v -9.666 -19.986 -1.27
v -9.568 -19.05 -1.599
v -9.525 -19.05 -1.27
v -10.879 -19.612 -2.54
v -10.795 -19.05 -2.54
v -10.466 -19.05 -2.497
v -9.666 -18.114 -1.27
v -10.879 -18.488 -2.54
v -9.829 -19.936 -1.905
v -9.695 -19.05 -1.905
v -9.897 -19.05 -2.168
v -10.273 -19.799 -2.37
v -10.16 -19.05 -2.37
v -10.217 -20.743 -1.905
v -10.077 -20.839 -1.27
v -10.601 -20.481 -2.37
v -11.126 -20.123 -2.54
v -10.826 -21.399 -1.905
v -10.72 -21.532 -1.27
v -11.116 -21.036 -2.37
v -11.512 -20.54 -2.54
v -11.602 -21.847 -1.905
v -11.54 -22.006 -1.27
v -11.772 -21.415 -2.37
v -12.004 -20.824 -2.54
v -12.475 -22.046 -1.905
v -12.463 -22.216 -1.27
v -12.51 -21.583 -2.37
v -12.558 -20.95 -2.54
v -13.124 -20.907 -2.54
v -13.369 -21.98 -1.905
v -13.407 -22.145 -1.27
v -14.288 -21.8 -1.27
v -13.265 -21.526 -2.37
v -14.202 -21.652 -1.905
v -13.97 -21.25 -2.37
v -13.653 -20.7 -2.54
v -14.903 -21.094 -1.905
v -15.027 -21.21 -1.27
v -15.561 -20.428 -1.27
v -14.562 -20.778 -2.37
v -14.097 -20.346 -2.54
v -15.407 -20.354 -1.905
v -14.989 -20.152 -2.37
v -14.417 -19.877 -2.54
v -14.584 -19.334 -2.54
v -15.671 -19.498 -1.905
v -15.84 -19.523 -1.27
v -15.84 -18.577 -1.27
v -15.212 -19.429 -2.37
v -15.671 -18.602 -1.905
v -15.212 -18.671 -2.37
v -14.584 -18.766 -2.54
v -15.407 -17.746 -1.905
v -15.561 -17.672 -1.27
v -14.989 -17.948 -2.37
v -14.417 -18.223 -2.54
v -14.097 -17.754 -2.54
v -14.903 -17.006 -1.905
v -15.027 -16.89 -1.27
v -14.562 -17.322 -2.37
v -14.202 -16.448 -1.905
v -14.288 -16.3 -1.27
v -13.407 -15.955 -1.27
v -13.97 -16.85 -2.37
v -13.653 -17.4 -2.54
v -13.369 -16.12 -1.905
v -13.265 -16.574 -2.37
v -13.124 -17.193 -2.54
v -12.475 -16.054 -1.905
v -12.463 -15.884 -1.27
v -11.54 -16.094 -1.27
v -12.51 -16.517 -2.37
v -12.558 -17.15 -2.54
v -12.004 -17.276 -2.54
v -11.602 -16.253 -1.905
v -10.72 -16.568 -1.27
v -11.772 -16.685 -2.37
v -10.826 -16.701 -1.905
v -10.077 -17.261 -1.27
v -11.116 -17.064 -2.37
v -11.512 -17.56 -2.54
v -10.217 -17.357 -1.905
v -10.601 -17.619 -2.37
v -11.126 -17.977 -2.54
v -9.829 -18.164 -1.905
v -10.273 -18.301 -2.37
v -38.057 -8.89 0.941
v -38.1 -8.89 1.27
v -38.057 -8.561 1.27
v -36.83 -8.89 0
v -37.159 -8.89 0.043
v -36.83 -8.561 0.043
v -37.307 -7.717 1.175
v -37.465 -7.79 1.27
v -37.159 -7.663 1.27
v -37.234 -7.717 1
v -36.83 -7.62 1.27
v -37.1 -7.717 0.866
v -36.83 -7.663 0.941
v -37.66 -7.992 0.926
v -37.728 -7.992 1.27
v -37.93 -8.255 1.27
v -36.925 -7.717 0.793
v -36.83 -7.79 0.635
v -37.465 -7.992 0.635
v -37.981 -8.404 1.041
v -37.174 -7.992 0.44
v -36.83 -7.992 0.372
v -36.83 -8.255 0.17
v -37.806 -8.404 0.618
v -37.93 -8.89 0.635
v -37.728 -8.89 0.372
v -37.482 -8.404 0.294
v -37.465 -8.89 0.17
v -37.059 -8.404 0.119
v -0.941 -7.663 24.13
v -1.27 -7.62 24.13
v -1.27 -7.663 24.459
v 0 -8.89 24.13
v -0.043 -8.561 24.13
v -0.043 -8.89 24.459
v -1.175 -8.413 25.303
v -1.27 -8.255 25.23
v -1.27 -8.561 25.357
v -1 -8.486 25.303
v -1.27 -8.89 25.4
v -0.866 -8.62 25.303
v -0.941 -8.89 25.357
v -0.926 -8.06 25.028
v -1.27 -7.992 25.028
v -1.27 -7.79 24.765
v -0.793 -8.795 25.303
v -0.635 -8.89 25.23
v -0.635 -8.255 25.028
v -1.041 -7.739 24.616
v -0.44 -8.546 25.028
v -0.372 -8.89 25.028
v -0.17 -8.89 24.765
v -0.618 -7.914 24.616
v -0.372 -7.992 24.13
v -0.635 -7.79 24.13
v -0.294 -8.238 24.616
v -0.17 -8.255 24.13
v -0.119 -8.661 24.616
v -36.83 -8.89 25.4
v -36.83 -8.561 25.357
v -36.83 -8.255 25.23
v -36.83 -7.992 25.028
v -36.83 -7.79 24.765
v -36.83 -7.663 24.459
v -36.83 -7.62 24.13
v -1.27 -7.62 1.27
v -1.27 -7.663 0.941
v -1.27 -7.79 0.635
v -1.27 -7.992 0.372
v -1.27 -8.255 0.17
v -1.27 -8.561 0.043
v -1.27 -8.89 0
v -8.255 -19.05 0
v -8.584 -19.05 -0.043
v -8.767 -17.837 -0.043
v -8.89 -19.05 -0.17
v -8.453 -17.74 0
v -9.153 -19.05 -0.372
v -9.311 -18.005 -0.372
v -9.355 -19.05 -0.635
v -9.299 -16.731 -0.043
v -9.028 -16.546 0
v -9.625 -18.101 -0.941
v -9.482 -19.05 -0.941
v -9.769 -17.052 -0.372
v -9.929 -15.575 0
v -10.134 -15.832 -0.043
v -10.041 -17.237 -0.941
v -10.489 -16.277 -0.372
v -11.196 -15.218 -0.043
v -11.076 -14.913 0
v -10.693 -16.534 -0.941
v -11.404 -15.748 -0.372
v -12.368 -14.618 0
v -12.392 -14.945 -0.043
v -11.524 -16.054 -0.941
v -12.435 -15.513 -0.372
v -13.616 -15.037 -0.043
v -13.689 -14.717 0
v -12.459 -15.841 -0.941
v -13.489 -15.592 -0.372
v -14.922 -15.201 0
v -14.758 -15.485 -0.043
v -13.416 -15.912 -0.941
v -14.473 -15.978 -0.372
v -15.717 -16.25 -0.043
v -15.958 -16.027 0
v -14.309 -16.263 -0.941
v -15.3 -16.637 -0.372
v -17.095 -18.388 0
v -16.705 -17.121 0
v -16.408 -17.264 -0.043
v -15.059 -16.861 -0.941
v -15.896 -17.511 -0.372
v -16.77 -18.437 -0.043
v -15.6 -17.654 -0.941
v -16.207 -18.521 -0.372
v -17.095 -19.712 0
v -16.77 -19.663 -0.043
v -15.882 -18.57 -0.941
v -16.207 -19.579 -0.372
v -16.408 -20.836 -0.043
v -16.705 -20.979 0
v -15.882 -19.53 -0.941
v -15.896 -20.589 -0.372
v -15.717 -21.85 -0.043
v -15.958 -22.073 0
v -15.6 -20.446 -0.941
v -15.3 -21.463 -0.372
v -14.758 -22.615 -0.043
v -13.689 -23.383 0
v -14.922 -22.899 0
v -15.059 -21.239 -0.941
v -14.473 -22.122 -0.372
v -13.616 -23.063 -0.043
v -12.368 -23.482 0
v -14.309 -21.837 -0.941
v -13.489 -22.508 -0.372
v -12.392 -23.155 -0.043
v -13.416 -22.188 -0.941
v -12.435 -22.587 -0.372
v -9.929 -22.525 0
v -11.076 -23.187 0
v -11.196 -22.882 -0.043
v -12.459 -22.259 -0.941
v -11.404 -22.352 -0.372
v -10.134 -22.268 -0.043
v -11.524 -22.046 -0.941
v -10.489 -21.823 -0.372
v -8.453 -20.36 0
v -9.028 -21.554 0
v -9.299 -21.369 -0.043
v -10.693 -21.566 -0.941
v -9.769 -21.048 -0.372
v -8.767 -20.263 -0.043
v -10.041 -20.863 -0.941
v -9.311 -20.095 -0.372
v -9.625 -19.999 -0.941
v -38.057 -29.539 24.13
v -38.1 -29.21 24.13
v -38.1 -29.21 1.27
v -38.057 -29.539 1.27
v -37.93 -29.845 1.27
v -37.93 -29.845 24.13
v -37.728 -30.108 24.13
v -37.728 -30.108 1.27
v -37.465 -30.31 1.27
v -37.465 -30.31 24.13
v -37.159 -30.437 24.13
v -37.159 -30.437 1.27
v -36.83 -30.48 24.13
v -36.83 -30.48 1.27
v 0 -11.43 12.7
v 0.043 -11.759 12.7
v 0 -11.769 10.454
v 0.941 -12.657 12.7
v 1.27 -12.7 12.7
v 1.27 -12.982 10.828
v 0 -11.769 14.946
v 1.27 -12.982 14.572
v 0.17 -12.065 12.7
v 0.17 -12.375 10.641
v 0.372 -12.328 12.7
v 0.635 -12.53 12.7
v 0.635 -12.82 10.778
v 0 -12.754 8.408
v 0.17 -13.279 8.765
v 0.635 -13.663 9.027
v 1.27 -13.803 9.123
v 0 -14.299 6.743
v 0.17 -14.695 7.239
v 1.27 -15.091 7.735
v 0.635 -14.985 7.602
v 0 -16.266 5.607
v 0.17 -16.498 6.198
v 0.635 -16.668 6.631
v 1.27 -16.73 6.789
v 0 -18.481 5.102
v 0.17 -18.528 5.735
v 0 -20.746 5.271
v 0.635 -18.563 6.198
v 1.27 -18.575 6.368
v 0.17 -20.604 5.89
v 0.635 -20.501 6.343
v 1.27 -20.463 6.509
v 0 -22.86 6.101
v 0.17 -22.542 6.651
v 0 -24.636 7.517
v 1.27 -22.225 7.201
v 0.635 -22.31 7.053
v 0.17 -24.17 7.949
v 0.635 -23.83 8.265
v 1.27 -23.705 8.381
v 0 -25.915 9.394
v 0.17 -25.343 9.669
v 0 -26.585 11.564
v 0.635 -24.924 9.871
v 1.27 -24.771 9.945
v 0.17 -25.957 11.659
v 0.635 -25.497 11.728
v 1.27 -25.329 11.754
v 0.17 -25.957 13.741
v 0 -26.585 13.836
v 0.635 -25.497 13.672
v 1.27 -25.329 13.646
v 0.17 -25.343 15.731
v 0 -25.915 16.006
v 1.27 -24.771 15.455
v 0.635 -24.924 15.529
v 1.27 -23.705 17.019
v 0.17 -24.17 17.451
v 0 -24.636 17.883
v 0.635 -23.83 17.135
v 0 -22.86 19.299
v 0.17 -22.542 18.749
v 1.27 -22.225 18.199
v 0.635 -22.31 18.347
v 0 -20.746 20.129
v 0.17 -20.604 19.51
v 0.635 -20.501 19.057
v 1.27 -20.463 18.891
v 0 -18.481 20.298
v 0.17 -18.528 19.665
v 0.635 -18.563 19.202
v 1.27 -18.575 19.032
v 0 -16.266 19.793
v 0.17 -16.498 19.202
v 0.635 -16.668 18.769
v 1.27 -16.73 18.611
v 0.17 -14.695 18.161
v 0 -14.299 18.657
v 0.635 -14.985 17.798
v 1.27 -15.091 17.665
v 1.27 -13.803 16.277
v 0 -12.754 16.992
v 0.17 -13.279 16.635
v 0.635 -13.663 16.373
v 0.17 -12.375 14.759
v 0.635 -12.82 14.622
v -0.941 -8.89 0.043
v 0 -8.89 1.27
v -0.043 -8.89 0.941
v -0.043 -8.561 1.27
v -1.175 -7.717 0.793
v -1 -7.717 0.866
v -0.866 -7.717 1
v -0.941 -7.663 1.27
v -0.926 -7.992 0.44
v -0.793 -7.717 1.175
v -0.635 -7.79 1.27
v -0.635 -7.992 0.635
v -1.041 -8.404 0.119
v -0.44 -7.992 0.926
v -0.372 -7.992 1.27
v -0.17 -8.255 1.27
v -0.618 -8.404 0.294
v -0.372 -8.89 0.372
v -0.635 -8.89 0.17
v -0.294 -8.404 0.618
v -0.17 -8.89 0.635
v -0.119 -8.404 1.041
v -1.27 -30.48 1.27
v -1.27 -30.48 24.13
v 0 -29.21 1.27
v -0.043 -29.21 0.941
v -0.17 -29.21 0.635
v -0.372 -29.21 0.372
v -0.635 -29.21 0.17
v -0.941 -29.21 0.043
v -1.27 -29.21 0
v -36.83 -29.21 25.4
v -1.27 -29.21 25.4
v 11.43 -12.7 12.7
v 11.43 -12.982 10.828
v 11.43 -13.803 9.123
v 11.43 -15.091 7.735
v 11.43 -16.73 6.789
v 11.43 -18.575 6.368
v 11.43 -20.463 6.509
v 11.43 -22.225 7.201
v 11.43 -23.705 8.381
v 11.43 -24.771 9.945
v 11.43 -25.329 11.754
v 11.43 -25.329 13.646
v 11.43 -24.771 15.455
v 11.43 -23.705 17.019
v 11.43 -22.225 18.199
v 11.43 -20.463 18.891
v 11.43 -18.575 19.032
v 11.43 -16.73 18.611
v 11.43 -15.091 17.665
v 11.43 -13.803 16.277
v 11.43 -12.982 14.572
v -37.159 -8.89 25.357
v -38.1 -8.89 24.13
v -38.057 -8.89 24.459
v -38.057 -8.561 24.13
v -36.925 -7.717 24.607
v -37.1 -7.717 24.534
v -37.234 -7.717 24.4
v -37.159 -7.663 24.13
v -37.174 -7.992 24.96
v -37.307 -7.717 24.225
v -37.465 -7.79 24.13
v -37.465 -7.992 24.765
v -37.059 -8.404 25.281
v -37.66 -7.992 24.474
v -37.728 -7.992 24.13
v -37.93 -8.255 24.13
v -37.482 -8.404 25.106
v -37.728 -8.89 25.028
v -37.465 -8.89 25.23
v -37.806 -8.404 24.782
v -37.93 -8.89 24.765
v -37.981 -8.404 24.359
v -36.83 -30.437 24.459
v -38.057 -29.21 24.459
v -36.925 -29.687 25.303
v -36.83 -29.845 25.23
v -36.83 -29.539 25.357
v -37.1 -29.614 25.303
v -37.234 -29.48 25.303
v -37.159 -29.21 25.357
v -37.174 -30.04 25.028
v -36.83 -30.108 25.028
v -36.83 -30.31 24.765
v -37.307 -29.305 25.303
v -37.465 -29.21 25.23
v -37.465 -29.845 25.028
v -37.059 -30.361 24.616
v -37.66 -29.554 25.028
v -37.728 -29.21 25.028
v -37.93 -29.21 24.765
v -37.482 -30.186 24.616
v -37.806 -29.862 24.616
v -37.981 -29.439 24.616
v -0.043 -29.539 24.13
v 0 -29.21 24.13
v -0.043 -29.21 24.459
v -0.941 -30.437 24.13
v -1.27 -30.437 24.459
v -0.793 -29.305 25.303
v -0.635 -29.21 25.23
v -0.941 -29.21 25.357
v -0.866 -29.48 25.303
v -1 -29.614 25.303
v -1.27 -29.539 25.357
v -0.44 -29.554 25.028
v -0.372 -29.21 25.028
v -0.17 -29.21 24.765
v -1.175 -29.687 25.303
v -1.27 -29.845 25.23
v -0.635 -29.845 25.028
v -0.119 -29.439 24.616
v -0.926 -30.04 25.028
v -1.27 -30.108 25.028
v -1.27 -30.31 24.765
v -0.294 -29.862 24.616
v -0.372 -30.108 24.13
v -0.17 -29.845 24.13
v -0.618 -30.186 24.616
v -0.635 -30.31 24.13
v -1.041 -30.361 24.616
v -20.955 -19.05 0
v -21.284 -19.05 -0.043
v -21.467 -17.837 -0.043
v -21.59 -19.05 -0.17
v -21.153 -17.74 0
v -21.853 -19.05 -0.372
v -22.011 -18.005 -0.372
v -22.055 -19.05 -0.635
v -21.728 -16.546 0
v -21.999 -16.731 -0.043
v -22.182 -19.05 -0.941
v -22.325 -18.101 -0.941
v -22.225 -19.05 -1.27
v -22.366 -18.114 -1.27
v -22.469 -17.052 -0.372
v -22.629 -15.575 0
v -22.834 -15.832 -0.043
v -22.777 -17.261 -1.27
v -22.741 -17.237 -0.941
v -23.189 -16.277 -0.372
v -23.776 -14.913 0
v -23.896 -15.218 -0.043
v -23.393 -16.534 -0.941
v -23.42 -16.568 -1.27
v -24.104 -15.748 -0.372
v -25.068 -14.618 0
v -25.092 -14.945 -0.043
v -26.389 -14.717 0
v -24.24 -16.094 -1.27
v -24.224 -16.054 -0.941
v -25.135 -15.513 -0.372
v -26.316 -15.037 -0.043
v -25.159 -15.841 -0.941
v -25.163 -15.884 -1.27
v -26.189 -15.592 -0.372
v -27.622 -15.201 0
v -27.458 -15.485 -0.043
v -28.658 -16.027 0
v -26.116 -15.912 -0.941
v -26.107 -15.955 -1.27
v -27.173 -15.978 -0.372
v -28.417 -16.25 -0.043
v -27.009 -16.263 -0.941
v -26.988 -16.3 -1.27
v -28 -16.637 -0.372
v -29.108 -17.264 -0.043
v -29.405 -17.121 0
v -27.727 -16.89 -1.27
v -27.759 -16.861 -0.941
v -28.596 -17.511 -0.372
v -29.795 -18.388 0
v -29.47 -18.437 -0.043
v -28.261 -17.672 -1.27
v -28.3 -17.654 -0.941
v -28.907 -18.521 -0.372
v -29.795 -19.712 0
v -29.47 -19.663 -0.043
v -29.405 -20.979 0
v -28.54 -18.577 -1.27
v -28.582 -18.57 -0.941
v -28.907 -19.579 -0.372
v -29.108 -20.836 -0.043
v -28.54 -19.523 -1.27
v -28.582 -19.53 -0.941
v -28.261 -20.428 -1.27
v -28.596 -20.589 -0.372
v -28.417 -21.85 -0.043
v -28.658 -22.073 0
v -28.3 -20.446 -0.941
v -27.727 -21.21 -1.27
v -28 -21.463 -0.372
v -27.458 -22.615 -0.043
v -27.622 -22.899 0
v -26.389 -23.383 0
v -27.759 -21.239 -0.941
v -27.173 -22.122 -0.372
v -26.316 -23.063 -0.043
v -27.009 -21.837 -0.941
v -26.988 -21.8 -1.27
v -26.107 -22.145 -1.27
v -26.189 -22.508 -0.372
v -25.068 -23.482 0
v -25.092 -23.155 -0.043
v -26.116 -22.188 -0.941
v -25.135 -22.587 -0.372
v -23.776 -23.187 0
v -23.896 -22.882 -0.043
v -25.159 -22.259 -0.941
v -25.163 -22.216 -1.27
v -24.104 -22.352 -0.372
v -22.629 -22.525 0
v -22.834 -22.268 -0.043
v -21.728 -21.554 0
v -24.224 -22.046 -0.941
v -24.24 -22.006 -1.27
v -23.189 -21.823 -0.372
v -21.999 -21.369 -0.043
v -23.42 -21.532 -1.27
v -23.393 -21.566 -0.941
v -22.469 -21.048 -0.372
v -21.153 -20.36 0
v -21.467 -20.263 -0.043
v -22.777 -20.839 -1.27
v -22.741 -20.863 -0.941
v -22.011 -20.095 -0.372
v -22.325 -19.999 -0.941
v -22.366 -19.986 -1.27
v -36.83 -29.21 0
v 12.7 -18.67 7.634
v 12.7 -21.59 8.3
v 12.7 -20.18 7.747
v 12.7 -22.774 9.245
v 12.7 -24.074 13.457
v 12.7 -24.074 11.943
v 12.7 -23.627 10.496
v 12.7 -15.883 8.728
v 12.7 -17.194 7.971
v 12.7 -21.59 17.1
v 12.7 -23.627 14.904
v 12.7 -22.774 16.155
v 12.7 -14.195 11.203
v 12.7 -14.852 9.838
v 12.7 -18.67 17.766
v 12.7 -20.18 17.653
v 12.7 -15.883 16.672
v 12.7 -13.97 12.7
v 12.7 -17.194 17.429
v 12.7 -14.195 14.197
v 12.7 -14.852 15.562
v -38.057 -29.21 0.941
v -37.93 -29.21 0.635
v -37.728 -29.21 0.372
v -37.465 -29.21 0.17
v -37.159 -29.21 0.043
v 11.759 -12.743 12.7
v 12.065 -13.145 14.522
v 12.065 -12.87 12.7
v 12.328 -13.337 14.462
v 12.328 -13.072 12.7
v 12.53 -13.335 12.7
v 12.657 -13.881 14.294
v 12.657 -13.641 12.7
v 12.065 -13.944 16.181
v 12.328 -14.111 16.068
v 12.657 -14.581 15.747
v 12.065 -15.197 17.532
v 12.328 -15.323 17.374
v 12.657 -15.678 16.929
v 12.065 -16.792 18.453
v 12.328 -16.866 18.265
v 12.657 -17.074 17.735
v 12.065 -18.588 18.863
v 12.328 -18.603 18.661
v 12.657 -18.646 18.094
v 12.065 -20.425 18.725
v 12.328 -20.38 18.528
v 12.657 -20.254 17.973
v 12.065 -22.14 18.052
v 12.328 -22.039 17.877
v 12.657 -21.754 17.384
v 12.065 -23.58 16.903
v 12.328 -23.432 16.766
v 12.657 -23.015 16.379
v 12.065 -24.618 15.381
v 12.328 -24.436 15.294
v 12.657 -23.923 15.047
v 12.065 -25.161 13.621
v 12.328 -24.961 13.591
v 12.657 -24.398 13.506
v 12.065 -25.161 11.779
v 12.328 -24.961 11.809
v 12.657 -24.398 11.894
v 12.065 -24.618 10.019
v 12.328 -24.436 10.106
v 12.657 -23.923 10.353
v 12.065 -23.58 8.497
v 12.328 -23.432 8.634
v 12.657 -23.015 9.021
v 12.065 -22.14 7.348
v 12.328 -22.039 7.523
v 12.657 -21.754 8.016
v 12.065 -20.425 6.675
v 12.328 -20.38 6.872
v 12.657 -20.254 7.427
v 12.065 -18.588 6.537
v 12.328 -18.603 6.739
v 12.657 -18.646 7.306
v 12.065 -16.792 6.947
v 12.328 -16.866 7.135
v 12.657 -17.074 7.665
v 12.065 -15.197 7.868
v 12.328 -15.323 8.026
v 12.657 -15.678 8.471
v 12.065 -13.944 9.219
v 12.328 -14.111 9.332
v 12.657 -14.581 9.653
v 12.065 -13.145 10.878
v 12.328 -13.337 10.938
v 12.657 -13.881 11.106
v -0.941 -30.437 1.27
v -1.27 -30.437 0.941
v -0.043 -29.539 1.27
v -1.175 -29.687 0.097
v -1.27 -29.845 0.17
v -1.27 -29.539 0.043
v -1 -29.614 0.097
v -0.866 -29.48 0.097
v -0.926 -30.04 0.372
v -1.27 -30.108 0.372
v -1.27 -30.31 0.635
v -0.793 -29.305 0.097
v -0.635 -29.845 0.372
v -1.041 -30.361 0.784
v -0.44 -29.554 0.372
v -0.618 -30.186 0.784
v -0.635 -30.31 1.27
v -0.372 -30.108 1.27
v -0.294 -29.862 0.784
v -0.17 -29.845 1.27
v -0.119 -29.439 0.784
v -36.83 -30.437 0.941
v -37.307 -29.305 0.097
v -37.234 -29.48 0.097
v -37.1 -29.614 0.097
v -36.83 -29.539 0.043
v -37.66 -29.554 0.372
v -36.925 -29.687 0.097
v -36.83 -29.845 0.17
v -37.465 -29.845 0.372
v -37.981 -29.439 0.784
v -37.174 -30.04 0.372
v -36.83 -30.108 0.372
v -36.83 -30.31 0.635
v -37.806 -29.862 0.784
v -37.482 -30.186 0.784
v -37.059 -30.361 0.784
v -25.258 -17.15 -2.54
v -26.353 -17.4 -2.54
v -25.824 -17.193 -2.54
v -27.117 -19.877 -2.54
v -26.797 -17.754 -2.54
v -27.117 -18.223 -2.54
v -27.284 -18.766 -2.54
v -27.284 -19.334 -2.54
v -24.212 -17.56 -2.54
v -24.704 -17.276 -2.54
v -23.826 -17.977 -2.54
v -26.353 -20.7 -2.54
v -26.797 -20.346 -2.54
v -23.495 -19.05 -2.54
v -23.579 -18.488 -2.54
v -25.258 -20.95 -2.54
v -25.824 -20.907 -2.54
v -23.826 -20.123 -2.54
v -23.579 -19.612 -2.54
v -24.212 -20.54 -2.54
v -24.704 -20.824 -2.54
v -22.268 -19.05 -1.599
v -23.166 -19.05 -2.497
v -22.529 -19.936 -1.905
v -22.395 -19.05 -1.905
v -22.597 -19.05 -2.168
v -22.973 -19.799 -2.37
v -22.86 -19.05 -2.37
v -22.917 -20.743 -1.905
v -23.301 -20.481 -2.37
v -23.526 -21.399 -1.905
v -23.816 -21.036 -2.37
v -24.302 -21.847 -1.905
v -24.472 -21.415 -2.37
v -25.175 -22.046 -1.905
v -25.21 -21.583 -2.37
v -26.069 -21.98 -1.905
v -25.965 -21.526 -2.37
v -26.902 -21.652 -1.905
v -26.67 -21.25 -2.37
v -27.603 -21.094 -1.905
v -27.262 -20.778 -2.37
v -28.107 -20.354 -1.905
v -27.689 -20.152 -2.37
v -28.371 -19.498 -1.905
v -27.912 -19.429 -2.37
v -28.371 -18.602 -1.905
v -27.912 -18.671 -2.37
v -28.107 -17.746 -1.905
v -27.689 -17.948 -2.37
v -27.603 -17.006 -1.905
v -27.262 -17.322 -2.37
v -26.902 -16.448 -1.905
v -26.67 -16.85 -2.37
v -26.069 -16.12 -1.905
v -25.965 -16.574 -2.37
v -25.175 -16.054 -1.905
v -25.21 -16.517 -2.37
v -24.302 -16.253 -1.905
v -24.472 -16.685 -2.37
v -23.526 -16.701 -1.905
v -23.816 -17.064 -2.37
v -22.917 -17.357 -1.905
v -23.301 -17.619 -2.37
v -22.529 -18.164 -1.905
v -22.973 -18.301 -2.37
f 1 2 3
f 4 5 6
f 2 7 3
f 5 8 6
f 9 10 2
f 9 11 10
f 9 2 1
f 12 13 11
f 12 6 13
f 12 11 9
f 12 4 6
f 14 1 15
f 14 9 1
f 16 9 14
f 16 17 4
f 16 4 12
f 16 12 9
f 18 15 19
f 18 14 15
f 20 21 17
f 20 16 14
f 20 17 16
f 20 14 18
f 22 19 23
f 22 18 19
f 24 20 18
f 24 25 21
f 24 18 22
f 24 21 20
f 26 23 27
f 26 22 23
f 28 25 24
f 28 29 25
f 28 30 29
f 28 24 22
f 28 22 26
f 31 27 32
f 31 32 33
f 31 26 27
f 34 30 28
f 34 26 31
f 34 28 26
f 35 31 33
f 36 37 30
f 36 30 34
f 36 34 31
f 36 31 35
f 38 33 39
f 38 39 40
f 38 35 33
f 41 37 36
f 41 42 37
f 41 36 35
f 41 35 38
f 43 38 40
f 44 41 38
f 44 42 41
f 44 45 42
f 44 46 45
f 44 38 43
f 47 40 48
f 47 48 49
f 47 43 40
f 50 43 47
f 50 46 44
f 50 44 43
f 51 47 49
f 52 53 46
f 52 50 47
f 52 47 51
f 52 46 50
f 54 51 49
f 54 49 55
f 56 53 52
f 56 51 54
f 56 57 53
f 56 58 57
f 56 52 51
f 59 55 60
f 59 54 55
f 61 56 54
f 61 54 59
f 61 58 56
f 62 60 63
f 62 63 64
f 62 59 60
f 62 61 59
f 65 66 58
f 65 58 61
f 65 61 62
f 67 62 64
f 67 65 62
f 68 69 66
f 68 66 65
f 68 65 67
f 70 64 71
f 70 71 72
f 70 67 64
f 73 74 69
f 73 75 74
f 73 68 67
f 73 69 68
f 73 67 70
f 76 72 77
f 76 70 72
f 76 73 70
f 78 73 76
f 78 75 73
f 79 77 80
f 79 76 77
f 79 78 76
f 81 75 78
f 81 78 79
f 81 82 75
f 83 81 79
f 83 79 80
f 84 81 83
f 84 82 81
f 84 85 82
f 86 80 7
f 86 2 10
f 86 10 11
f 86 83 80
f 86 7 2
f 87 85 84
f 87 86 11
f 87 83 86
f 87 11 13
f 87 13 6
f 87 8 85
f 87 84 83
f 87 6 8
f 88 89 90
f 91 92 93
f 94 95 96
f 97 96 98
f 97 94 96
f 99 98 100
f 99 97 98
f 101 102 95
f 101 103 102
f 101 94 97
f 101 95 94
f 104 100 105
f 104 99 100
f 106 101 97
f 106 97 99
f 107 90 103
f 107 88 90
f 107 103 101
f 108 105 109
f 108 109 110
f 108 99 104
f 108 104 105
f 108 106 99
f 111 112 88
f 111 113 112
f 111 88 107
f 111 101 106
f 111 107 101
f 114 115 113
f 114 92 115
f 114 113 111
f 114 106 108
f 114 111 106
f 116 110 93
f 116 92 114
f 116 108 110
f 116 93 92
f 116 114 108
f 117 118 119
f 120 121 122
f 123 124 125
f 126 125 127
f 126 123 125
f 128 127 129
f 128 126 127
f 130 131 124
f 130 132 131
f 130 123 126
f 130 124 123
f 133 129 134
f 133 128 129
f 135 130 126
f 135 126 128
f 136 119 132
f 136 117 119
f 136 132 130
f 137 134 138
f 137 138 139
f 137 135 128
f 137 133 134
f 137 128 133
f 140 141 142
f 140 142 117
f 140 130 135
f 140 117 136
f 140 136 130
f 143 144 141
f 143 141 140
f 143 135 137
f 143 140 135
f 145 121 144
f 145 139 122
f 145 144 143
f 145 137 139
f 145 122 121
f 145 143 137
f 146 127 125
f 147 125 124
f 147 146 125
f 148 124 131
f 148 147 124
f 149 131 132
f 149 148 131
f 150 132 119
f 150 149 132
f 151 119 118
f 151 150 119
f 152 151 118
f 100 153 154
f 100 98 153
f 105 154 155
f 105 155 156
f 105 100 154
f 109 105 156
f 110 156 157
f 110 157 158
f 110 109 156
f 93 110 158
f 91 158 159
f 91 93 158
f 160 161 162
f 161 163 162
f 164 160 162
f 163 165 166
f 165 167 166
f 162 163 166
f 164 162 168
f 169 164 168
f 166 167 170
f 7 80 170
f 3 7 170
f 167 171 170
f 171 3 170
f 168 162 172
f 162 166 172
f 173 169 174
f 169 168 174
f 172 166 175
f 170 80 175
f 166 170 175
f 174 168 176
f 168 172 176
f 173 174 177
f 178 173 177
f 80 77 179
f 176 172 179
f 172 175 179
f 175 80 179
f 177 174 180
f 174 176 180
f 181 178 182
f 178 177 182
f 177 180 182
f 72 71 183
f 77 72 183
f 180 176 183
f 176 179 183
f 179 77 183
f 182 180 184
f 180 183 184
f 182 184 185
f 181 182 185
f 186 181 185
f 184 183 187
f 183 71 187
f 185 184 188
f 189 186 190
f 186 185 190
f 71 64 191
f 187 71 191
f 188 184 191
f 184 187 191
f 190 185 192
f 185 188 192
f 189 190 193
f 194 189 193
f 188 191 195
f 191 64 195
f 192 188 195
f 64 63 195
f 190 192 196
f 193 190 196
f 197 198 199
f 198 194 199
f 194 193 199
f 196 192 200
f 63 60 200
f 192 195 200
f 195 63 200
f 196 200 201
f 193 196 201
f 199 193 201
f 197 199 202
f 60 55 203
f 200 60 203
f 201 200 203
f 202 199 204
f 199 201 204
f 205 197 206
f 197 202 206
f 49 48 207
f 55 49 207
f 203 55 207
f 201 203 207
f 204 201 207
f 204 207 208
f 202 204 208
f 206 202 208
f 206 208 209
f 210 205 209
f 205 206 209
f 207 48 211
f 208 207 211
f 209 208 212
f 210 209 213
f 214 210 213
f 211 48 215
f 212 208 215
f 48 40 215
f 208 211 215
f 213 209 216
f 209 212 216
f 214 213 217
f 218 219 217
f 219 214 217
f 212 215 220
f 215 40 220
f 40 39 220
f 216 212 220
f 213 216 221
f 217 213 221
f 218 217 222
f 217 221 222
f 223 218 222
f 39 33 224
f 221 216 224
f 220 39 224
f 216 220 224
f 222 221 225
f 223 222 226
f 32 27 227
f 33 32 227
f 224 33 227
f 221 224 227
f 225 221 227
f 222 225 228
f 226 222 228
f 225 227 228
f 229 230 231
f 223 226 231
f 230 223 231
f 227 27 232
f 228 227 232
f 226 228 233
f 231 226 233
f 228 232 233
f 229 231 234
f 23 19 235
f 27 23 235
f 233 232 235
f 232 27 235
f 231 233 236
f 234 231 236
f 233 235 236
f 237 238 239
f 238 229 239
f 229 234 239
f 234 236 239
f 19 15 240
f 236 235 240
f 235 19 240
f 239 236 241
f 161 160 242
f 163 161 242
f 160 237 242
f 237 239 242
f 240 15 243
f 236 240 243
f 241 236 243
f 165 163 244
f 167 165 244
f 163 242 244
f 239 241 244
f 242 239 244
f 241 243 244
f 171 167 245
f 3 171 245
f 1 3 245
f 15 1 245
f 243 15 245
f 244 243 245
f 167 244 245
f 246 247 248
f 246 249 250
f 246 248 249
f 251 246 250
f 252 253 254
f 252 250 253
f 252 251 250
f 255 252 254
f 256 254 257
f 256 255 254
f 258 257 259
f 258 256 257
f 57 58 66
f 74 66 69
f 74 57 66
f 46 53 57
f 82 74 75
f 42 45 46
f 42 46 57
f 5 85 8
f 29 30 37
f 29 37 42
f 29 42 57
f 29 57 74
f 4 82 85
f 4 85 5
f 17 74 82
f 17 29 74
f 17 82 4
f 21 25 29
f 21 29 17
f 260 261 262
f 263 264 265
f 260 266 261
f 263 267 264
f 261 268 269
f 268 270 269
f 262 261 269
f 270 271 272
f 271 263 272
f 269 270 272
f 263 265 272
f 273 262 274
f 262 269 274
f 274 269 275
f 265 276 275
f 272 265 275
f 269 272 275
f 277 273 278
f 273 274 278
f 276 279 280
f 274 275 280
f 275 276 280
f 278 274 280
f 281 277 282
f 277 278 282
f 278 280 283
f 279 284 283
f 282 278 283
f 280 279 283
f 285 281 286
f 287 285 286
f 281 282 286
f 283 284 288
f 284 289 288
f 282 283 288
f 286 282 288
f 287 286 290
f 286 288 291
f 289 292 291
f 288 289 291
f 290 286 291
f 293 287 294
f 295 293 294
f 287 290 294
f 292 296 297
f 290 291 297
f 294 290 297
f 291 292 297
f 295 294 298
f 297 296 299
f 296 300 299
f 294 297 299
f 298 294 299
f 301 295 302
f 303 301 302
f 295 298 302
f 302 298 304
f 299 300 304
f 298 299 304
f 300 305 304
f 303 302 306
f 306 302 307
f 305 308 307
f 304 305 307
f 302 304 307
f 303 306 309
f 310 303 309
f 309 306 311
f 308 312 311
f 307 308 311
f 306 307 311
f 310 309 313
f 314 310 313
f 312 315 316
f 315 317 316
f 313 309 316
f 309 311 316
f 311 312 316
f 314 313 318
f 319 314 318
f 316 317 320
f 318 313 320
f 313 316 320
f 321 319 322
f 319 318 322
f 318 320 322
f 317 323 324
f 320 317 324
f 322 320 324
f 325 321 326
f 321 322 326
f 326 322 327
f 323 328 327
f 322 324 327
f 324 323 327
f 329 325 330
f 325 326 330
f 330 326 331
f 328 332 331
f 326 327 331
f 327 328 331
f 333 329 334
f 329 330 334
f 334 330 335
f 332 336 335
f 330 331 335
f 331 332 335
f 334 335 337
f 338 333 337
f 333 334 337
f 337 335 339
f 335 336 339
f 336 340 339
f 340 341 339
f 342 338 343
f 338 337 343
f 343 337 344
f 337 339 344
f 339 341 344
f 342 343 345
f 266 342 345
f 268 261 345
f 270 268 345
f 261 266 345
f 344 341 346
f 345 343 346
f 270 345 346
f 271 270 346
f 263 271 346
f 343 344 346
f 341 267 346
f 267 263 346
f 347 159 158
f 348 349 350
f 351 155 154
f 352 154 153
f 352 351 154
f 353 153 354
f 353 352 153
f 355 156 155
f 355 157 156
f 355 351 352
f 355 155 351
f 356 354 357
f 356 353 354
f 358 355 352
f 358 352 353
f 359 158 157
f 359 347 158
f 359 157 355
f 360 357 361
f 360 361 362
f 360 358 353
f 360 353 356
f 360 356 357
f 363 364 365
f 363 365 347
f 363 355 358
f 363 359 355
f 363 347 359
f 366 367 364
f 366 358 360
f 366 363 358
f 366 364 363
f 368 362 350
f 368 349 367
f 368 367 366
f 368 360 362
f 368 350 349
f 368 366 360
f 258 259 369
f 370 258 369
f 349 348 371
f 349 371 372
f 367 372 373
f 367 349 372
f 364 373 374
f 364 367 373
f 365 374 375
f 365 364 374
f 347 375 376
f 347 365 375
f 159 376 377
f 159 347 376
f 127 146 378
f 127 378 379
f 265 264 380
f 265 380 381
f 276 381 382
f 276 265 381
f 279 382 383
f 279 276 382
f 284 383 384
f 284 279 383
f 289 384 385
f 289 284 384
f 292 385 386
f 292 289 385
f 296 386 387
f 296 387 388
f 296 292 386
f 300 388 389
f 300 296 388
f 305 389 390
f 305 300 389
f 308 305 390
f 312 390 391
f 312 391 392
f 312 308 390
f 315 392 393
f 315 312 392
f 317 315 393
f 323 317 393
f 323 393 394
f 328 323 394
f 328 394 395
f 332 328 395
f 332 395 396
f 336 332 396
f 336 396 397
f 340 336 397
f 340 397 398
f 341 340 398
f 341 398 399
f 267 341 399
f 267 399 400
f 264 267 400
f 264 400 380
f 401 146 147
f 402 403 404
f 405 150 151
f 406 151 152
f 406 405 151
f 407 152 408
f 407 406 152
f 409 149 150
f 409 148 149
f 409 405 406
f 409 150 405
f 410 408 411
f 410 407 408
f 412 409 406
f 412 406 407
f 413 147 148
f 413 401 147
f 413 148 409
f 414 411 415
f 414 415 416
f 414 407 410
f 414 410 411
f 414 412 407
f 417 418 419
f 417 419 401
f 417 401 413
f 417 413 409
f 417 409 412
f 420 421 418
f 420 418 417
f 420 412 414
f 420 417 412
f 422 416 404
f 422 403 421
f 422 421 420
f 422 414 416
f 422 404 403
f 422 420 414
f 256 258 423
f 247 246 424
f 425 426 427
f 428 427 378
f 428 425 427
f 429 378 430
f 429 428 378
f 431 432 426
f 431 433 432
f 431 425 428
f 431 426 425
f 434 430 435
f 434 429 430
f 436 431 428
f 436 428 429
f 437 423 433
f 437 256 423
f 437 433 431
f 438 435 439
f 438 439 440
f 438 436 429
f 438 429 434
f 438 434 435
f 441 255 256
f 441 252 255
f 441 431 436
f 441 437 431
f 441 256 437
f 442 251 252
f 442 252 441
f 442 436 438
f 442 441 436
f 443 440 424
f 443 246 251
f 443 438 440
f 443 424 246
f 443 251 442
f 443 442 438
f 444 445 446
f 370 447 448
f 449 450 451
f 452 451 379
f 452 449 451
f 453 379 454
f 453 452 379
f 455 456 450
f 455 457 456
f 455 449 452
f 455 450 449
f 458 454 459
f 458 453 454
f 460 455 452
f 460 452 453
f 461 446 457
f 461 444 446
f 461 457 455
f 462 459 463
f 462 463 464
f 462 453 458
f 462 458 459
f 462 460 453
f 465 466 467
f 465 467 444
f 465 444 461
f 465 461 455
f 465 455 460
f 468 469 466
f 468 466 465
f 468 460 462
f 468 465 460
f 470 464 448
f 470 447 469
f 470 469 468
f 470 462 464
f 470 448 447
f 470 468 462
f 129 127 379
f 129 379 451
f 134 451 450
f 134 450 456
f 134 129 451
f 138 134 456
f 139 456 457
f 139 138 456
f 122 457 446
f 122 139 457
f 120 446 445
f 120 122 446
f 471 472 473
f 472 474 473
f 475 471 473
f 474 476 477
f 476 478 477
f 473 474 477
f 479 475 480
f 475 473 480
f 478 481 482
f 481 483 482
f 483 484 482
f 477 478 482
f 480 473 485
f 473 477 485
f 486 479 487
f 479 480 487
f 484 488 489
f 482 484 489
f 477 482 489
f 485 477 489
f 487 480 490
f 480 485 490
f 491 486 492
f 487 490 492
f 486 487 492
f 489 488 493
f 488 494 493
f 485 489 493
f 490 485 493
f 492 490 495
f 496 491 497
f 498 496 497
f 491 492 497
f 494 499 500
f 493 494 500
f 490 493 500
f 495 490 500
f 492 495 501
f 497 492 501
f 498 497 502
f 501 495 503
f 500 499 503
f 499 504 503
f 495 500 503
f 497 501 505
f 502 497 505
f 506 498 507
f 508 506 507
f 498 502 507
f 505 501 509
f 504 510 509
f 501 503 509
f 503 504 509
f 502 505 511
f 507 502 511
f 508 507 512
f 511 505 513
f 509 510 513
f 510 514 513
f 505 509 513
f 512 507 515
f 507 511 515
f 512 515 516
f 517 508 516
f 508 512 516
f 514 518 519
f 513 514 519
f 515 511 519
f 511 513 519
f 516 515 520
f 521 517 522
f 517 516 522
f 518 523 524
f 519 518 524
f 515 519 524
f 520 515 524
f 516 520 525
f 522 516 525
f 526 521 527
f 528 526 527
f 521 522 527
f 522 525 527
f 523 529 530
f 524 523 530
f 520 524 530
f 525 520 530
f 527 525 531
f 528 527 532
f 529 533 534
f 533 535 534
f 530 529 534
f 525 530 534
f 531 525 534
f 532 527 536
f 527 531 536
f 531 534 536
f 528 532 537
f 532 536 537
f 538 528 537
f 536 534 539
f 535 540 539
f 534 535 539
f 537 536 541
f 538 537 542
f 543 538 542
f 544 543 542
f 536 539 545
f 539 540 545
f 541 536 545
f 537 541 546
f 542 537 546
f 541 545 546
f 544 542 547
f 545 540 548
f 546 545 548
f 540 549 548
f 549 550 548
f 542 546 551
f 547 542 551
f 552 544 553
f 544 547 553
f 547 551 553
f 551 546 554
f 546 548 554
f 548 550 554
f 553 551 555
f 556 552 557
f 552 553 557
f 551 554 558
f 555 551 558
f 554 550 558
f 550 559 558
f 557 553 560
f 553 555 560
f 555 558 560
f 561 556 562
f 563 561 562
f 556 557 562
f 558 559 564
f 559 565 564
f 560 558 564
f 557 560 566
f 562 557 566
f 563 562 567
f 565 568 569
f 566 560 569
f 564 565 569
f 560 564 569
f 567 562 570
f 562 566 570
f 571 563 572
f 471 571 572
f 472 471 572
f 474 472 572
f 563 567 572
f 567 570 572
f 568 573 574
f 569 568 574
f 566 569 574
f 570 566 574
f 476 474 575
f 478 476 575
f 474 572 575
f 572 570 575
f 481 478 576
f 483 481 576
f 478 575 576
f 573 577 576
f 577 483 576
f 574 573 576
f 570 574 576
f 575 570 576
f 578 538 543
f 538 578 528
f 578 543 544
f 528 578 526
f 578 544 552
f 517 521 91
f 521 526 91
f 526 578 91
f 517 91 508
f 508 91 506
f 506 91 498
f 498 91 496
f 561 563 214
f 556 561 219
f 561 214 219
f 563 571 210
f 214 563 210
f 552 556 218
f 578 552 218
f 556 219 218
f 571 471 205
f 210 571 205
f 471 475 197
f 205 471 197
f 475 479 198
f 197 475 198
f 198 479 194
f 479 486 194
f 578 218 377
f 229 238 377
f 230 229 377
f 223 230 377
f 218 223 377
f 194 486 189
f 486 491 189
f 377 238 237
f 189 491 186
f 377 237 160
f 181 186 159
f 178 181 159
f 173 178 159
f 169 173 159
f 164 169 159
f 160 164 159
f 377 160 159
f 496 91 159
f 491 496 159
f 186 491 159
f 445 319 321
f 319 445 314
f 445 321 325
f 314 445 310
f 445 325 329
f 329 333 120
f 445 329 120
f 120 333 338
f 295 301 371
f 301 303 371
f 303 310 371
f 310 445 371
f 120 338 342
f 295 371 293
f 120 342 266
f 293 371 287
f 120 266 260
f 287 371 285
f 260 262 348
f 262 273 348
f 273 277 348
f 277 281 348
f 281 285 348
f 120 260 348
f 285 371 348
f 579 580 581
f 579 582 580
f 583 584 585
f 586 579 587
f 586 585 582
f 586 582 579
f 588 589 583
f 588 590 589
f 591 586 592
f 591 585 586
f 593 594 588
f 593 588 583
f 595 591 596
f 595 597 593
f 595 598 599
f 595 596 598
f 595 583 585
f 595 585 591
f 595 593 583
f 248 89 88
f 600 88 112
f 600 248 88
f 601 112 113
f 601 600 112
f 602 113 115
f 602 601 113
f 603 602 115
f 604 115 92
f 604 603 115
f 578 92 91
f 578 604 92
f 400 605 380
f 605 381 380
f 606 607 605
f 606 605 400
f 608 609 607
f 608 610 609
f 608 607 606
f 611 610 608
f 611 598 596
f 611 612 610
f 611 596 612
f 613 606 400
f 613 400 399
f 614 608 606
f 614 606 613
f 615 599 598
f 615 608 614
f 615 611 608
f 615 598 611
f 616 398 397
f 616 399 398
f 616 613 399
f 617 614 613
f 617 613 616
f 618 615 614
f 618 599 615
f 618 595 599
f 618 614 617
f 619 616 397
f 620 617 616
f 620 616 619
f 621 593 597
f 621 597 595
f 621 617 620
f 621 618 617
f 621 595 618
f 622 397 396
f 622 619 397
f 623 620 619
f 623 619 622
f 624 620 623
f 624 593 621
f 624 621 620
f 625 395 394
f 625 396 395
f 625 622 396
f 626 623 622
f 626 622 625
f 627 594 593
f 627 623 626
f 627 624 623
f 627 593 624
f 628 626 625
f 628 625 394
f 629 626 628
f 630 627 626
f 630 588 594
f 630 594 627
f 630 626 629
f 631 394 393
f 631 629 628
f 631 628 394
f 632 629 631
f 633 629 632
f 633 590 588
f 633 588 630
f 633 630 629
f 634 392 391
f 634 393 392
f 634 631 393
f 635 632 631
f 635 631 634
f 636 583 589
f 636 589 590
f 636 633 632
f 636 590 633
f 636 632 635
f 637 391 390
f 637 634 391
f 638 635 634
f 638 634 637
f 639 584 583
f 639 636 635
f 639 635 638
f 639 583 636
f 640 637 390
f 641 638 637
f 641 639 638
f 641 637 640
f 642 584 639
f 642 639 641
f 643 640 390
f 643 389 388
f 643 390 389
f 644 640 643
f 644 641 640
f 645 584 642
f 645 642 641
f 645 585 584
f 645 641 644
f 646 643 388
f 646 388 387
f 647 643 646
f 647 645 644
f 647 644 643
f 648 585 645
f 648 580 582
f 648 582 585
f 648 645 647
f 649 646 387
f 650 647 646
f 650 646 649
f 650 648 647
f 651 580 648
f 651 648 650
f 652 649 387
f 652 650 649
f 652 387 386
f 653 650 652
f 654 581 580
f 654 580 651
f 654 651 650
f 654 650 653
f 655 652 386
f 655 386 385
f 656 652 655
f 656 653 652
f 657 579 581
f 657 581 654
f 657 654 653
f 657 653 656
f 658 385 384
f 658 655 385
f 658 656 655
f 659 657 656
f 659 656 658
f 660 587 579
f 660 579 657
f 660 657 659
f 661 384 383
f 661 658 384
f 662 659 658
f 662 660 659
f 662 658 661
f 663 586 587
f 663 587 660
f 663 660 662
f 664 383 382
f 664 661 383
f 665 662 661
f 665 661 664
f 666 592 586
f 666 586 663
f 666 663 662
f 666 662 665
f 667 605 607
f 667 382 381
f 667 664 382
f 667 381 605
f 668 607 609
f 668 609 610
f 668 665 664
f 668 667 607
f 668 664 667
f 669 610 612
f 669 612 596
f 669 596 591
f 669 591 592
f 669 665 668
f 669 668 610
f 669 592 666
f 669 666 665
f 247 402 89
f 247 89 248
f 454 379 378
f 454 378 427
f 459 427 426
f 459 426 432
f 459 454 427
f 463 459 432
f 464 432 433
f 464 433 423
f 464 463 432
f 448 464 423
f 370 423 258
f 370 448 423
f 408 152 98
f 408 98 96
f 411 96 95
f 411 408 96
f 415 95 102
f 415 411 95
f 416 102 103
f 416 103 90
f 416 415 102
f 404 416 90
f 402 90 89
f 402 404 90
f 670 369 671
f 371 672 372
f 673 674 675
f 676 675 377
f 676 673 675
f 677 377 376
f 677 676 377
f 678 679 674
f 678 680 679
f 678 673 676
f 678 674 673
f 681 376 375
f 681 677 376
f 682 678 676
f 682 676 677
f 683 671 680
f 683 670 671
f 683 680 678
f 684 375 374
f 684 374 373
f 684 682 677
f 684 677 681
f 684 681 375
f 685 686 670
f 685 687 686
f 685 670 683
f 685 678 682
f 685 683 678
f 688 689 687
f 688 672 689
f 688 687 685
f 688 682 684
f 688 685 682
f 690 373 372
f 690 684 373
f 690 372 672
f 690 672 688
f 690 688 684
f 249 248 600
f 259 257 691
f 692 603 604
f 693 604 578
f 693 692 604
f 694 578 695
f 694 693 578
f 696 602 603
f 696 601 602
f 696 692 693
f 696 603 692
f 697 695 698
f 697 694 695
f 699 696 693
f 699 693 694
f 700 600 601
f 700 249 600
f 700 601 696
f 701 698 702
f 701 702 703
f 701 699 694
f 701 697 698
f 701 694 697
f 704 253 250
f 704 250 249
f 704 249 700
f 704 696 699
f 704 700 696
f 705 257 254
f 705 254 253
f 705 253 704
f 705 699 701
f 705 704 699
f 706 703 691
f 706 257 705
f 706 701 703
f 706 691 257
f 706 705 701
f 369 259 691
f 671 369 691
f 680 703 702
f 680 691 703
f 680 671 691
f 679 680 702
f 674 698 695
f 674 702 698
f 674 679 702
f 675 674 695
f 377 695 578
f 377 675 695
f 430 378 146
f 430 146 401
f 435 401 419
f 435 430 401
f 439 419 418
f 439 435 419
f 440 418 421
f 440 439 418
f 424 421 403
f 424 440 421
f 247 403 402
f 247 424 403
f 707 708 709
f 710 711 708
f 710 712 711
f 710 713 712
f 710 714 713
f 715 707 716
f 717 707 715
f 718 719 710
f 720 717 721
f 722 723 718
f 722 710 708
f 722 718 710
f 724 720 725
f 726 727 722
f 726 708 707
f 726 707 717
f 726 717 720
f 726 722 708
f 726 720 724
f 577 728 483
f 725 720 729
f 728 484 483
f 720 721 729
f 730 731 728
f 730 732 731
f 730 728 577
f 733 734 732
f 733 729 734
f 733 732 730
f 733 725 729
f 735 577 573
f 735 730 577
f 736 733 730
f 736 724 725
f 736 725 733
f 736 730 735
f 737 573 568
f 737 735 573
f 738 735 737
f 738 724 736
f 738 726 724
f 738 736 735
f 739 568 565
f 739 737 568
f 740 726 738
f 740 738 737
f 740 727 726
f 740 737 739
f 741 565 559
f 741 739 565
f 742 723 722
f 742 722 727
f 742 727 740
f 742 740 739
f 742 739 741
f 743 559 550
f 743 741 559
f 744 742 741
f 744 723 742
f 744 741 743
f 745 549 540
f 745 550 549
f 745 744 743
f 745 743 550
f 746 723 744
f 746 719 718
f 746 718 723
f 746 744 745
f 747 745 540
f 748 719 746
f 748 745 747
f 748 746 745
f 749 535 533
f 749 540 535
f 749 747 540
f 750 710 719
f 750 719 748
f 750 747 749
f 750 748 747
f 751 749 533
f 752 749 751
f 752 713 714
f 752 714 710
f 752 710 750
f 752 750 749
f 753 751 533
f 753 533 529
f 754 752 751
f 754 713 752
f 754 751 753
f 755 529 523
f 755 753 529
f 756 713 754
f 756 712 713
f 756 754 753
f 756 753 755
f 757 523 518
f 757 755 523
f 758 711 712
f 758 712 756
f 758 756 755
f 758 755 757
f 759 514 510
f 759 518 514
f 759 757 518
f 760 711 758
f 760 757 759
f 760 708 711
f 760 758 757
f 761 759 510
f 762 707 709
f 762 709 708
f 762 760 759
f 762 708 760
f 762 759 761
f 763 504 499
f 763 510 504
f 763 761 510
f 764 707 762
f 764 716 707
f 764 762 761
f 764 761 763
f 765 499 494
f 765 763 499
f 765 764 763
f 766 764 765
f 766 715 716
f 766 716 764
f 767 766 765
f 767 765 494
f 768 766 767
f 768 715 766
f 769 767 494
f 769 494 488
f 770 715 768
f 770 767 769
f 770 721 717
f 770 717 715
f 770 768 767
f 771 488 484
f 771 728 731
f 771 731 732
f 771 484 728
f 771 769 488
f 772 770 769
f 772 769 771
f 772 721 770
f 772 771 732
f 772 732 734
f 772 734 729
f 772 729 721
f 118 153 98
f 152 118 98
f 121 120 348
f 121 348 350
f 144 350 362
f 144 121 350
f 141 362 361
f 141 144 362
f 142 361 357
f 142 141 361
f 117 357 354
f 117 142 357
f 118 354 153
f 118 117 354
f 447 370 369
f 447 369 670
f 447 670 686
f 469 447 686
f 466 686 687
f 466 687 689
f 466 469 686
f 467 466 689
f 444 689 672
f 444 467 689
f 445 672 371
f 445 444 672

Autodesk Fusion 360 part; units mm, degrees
sketch "Sketch1" plane through (0, 0, 0) normal (0, 0, 1) x (1, 0, 0)
  line L0 (0, 0) -> (-38.1, 0)
  line L1 (-38.1, 0) -> (-38.1, -38.1)
  line L2 (-38.1, -38.1) -> (0, -38.1)
  line L3 (0, -38.1) -> (0, 0)
  dimension "d1" = 38.1
  dimension "d2" = 38.1
extrude "Extrude1" add sketch "Sketch1" along normal blind 25.4
sketch "Sketch2" plane through (0, 0, 0) normal (1, 0, 0) x (0, 1, 0)
  line L0 (-38.1, 0) -> (0, 0)
  line L1 (0, 0) -> (0, 25.4)
  line L2 (0, 25.4) -> (-38.1, 25.4)
  line L3 (-38.1, 25.4) -> (-38.1, 0)
  line L4 (-38.1, 0) -> (-19.05, 0)
  line L5 (-19.05, 0) -> (-19.05, 12.7)
  circle A0 centre (-19.05, 12.7) radius 6.35
  dimension "d5" = 12.7
extrude "Extrude2" add sketch "Sketch2" along normal blind 12.7 contours A0
sketch "Sketch3" plane through (0, 0, 0) normal (0, 0, -1) x (1, 0, 0)
  line L0 (0, 0) -> (0, 38.1)
  line L1 (0, 38.1) -> (-38.1, 38.1)
  line L2 (-38.1, 38.1) -> (-38.1, 0)
  line L3 (-38.1, 0) -> (0, 0)
  line L4 (-38.1, 19.05) -> (-25.4, 19.05)
  line L5 (0, 19.05) -> (-12.7, 19.05)
  circle A0 centre (-12.7, 19.05) radius 3.175
  circle A1 centre (-25.4, 19.05) radius 3.175
  dimension "d9" = 12.7
  dimension "d10" = 12.7
  dimension "d11" = 6.35
  dimension "d12" = 6.35
extrude "Extrude3" add sketch "Sketch3" along normal blind 5.08 contours A1
extrude "Extrude4" add sketch "Sketch3" along normal blind 5.08 contours A0
extrude "Extrude5" cut 1 faces at (-12.7, 0, 8.4667) along direction (0, -1, 0) blind 7.62
extrude "Extrude6" cut 1 faces at (-25.4, -38.1, 8.4667) along direction (0, 1, 0) blind 7.62
extrude "Extrude7" cut 2 faces at (-13.6995, -18.8958, -5.08) (-24.8413, -17.3109, -5.08) along direction (0, 0, 1) blind 2.54
fillet "Fillet1" radius 1.27 12 faces at (-25.4, -30.48, 8.4667) (0, -18.8918, 2.1226) (-38.1, -15.24, 8.4667) (12.7, -19.3851, 13.862) (-12.7, -7.62, 8.4667) (-12.7, -22.86, 25.4) (4.2333, -12.7079, 13.0165) (-34.925, -19.05, 0) (-13.6995, -18.8958, -2.54) (-24.8413, -17.3109, -2.54) (-9.5408, -18.7339, -0.8467) (-22.2289, -19.2083, -0.8467)
equation "d6 = ( 1 / 2 ) * 1 in"
